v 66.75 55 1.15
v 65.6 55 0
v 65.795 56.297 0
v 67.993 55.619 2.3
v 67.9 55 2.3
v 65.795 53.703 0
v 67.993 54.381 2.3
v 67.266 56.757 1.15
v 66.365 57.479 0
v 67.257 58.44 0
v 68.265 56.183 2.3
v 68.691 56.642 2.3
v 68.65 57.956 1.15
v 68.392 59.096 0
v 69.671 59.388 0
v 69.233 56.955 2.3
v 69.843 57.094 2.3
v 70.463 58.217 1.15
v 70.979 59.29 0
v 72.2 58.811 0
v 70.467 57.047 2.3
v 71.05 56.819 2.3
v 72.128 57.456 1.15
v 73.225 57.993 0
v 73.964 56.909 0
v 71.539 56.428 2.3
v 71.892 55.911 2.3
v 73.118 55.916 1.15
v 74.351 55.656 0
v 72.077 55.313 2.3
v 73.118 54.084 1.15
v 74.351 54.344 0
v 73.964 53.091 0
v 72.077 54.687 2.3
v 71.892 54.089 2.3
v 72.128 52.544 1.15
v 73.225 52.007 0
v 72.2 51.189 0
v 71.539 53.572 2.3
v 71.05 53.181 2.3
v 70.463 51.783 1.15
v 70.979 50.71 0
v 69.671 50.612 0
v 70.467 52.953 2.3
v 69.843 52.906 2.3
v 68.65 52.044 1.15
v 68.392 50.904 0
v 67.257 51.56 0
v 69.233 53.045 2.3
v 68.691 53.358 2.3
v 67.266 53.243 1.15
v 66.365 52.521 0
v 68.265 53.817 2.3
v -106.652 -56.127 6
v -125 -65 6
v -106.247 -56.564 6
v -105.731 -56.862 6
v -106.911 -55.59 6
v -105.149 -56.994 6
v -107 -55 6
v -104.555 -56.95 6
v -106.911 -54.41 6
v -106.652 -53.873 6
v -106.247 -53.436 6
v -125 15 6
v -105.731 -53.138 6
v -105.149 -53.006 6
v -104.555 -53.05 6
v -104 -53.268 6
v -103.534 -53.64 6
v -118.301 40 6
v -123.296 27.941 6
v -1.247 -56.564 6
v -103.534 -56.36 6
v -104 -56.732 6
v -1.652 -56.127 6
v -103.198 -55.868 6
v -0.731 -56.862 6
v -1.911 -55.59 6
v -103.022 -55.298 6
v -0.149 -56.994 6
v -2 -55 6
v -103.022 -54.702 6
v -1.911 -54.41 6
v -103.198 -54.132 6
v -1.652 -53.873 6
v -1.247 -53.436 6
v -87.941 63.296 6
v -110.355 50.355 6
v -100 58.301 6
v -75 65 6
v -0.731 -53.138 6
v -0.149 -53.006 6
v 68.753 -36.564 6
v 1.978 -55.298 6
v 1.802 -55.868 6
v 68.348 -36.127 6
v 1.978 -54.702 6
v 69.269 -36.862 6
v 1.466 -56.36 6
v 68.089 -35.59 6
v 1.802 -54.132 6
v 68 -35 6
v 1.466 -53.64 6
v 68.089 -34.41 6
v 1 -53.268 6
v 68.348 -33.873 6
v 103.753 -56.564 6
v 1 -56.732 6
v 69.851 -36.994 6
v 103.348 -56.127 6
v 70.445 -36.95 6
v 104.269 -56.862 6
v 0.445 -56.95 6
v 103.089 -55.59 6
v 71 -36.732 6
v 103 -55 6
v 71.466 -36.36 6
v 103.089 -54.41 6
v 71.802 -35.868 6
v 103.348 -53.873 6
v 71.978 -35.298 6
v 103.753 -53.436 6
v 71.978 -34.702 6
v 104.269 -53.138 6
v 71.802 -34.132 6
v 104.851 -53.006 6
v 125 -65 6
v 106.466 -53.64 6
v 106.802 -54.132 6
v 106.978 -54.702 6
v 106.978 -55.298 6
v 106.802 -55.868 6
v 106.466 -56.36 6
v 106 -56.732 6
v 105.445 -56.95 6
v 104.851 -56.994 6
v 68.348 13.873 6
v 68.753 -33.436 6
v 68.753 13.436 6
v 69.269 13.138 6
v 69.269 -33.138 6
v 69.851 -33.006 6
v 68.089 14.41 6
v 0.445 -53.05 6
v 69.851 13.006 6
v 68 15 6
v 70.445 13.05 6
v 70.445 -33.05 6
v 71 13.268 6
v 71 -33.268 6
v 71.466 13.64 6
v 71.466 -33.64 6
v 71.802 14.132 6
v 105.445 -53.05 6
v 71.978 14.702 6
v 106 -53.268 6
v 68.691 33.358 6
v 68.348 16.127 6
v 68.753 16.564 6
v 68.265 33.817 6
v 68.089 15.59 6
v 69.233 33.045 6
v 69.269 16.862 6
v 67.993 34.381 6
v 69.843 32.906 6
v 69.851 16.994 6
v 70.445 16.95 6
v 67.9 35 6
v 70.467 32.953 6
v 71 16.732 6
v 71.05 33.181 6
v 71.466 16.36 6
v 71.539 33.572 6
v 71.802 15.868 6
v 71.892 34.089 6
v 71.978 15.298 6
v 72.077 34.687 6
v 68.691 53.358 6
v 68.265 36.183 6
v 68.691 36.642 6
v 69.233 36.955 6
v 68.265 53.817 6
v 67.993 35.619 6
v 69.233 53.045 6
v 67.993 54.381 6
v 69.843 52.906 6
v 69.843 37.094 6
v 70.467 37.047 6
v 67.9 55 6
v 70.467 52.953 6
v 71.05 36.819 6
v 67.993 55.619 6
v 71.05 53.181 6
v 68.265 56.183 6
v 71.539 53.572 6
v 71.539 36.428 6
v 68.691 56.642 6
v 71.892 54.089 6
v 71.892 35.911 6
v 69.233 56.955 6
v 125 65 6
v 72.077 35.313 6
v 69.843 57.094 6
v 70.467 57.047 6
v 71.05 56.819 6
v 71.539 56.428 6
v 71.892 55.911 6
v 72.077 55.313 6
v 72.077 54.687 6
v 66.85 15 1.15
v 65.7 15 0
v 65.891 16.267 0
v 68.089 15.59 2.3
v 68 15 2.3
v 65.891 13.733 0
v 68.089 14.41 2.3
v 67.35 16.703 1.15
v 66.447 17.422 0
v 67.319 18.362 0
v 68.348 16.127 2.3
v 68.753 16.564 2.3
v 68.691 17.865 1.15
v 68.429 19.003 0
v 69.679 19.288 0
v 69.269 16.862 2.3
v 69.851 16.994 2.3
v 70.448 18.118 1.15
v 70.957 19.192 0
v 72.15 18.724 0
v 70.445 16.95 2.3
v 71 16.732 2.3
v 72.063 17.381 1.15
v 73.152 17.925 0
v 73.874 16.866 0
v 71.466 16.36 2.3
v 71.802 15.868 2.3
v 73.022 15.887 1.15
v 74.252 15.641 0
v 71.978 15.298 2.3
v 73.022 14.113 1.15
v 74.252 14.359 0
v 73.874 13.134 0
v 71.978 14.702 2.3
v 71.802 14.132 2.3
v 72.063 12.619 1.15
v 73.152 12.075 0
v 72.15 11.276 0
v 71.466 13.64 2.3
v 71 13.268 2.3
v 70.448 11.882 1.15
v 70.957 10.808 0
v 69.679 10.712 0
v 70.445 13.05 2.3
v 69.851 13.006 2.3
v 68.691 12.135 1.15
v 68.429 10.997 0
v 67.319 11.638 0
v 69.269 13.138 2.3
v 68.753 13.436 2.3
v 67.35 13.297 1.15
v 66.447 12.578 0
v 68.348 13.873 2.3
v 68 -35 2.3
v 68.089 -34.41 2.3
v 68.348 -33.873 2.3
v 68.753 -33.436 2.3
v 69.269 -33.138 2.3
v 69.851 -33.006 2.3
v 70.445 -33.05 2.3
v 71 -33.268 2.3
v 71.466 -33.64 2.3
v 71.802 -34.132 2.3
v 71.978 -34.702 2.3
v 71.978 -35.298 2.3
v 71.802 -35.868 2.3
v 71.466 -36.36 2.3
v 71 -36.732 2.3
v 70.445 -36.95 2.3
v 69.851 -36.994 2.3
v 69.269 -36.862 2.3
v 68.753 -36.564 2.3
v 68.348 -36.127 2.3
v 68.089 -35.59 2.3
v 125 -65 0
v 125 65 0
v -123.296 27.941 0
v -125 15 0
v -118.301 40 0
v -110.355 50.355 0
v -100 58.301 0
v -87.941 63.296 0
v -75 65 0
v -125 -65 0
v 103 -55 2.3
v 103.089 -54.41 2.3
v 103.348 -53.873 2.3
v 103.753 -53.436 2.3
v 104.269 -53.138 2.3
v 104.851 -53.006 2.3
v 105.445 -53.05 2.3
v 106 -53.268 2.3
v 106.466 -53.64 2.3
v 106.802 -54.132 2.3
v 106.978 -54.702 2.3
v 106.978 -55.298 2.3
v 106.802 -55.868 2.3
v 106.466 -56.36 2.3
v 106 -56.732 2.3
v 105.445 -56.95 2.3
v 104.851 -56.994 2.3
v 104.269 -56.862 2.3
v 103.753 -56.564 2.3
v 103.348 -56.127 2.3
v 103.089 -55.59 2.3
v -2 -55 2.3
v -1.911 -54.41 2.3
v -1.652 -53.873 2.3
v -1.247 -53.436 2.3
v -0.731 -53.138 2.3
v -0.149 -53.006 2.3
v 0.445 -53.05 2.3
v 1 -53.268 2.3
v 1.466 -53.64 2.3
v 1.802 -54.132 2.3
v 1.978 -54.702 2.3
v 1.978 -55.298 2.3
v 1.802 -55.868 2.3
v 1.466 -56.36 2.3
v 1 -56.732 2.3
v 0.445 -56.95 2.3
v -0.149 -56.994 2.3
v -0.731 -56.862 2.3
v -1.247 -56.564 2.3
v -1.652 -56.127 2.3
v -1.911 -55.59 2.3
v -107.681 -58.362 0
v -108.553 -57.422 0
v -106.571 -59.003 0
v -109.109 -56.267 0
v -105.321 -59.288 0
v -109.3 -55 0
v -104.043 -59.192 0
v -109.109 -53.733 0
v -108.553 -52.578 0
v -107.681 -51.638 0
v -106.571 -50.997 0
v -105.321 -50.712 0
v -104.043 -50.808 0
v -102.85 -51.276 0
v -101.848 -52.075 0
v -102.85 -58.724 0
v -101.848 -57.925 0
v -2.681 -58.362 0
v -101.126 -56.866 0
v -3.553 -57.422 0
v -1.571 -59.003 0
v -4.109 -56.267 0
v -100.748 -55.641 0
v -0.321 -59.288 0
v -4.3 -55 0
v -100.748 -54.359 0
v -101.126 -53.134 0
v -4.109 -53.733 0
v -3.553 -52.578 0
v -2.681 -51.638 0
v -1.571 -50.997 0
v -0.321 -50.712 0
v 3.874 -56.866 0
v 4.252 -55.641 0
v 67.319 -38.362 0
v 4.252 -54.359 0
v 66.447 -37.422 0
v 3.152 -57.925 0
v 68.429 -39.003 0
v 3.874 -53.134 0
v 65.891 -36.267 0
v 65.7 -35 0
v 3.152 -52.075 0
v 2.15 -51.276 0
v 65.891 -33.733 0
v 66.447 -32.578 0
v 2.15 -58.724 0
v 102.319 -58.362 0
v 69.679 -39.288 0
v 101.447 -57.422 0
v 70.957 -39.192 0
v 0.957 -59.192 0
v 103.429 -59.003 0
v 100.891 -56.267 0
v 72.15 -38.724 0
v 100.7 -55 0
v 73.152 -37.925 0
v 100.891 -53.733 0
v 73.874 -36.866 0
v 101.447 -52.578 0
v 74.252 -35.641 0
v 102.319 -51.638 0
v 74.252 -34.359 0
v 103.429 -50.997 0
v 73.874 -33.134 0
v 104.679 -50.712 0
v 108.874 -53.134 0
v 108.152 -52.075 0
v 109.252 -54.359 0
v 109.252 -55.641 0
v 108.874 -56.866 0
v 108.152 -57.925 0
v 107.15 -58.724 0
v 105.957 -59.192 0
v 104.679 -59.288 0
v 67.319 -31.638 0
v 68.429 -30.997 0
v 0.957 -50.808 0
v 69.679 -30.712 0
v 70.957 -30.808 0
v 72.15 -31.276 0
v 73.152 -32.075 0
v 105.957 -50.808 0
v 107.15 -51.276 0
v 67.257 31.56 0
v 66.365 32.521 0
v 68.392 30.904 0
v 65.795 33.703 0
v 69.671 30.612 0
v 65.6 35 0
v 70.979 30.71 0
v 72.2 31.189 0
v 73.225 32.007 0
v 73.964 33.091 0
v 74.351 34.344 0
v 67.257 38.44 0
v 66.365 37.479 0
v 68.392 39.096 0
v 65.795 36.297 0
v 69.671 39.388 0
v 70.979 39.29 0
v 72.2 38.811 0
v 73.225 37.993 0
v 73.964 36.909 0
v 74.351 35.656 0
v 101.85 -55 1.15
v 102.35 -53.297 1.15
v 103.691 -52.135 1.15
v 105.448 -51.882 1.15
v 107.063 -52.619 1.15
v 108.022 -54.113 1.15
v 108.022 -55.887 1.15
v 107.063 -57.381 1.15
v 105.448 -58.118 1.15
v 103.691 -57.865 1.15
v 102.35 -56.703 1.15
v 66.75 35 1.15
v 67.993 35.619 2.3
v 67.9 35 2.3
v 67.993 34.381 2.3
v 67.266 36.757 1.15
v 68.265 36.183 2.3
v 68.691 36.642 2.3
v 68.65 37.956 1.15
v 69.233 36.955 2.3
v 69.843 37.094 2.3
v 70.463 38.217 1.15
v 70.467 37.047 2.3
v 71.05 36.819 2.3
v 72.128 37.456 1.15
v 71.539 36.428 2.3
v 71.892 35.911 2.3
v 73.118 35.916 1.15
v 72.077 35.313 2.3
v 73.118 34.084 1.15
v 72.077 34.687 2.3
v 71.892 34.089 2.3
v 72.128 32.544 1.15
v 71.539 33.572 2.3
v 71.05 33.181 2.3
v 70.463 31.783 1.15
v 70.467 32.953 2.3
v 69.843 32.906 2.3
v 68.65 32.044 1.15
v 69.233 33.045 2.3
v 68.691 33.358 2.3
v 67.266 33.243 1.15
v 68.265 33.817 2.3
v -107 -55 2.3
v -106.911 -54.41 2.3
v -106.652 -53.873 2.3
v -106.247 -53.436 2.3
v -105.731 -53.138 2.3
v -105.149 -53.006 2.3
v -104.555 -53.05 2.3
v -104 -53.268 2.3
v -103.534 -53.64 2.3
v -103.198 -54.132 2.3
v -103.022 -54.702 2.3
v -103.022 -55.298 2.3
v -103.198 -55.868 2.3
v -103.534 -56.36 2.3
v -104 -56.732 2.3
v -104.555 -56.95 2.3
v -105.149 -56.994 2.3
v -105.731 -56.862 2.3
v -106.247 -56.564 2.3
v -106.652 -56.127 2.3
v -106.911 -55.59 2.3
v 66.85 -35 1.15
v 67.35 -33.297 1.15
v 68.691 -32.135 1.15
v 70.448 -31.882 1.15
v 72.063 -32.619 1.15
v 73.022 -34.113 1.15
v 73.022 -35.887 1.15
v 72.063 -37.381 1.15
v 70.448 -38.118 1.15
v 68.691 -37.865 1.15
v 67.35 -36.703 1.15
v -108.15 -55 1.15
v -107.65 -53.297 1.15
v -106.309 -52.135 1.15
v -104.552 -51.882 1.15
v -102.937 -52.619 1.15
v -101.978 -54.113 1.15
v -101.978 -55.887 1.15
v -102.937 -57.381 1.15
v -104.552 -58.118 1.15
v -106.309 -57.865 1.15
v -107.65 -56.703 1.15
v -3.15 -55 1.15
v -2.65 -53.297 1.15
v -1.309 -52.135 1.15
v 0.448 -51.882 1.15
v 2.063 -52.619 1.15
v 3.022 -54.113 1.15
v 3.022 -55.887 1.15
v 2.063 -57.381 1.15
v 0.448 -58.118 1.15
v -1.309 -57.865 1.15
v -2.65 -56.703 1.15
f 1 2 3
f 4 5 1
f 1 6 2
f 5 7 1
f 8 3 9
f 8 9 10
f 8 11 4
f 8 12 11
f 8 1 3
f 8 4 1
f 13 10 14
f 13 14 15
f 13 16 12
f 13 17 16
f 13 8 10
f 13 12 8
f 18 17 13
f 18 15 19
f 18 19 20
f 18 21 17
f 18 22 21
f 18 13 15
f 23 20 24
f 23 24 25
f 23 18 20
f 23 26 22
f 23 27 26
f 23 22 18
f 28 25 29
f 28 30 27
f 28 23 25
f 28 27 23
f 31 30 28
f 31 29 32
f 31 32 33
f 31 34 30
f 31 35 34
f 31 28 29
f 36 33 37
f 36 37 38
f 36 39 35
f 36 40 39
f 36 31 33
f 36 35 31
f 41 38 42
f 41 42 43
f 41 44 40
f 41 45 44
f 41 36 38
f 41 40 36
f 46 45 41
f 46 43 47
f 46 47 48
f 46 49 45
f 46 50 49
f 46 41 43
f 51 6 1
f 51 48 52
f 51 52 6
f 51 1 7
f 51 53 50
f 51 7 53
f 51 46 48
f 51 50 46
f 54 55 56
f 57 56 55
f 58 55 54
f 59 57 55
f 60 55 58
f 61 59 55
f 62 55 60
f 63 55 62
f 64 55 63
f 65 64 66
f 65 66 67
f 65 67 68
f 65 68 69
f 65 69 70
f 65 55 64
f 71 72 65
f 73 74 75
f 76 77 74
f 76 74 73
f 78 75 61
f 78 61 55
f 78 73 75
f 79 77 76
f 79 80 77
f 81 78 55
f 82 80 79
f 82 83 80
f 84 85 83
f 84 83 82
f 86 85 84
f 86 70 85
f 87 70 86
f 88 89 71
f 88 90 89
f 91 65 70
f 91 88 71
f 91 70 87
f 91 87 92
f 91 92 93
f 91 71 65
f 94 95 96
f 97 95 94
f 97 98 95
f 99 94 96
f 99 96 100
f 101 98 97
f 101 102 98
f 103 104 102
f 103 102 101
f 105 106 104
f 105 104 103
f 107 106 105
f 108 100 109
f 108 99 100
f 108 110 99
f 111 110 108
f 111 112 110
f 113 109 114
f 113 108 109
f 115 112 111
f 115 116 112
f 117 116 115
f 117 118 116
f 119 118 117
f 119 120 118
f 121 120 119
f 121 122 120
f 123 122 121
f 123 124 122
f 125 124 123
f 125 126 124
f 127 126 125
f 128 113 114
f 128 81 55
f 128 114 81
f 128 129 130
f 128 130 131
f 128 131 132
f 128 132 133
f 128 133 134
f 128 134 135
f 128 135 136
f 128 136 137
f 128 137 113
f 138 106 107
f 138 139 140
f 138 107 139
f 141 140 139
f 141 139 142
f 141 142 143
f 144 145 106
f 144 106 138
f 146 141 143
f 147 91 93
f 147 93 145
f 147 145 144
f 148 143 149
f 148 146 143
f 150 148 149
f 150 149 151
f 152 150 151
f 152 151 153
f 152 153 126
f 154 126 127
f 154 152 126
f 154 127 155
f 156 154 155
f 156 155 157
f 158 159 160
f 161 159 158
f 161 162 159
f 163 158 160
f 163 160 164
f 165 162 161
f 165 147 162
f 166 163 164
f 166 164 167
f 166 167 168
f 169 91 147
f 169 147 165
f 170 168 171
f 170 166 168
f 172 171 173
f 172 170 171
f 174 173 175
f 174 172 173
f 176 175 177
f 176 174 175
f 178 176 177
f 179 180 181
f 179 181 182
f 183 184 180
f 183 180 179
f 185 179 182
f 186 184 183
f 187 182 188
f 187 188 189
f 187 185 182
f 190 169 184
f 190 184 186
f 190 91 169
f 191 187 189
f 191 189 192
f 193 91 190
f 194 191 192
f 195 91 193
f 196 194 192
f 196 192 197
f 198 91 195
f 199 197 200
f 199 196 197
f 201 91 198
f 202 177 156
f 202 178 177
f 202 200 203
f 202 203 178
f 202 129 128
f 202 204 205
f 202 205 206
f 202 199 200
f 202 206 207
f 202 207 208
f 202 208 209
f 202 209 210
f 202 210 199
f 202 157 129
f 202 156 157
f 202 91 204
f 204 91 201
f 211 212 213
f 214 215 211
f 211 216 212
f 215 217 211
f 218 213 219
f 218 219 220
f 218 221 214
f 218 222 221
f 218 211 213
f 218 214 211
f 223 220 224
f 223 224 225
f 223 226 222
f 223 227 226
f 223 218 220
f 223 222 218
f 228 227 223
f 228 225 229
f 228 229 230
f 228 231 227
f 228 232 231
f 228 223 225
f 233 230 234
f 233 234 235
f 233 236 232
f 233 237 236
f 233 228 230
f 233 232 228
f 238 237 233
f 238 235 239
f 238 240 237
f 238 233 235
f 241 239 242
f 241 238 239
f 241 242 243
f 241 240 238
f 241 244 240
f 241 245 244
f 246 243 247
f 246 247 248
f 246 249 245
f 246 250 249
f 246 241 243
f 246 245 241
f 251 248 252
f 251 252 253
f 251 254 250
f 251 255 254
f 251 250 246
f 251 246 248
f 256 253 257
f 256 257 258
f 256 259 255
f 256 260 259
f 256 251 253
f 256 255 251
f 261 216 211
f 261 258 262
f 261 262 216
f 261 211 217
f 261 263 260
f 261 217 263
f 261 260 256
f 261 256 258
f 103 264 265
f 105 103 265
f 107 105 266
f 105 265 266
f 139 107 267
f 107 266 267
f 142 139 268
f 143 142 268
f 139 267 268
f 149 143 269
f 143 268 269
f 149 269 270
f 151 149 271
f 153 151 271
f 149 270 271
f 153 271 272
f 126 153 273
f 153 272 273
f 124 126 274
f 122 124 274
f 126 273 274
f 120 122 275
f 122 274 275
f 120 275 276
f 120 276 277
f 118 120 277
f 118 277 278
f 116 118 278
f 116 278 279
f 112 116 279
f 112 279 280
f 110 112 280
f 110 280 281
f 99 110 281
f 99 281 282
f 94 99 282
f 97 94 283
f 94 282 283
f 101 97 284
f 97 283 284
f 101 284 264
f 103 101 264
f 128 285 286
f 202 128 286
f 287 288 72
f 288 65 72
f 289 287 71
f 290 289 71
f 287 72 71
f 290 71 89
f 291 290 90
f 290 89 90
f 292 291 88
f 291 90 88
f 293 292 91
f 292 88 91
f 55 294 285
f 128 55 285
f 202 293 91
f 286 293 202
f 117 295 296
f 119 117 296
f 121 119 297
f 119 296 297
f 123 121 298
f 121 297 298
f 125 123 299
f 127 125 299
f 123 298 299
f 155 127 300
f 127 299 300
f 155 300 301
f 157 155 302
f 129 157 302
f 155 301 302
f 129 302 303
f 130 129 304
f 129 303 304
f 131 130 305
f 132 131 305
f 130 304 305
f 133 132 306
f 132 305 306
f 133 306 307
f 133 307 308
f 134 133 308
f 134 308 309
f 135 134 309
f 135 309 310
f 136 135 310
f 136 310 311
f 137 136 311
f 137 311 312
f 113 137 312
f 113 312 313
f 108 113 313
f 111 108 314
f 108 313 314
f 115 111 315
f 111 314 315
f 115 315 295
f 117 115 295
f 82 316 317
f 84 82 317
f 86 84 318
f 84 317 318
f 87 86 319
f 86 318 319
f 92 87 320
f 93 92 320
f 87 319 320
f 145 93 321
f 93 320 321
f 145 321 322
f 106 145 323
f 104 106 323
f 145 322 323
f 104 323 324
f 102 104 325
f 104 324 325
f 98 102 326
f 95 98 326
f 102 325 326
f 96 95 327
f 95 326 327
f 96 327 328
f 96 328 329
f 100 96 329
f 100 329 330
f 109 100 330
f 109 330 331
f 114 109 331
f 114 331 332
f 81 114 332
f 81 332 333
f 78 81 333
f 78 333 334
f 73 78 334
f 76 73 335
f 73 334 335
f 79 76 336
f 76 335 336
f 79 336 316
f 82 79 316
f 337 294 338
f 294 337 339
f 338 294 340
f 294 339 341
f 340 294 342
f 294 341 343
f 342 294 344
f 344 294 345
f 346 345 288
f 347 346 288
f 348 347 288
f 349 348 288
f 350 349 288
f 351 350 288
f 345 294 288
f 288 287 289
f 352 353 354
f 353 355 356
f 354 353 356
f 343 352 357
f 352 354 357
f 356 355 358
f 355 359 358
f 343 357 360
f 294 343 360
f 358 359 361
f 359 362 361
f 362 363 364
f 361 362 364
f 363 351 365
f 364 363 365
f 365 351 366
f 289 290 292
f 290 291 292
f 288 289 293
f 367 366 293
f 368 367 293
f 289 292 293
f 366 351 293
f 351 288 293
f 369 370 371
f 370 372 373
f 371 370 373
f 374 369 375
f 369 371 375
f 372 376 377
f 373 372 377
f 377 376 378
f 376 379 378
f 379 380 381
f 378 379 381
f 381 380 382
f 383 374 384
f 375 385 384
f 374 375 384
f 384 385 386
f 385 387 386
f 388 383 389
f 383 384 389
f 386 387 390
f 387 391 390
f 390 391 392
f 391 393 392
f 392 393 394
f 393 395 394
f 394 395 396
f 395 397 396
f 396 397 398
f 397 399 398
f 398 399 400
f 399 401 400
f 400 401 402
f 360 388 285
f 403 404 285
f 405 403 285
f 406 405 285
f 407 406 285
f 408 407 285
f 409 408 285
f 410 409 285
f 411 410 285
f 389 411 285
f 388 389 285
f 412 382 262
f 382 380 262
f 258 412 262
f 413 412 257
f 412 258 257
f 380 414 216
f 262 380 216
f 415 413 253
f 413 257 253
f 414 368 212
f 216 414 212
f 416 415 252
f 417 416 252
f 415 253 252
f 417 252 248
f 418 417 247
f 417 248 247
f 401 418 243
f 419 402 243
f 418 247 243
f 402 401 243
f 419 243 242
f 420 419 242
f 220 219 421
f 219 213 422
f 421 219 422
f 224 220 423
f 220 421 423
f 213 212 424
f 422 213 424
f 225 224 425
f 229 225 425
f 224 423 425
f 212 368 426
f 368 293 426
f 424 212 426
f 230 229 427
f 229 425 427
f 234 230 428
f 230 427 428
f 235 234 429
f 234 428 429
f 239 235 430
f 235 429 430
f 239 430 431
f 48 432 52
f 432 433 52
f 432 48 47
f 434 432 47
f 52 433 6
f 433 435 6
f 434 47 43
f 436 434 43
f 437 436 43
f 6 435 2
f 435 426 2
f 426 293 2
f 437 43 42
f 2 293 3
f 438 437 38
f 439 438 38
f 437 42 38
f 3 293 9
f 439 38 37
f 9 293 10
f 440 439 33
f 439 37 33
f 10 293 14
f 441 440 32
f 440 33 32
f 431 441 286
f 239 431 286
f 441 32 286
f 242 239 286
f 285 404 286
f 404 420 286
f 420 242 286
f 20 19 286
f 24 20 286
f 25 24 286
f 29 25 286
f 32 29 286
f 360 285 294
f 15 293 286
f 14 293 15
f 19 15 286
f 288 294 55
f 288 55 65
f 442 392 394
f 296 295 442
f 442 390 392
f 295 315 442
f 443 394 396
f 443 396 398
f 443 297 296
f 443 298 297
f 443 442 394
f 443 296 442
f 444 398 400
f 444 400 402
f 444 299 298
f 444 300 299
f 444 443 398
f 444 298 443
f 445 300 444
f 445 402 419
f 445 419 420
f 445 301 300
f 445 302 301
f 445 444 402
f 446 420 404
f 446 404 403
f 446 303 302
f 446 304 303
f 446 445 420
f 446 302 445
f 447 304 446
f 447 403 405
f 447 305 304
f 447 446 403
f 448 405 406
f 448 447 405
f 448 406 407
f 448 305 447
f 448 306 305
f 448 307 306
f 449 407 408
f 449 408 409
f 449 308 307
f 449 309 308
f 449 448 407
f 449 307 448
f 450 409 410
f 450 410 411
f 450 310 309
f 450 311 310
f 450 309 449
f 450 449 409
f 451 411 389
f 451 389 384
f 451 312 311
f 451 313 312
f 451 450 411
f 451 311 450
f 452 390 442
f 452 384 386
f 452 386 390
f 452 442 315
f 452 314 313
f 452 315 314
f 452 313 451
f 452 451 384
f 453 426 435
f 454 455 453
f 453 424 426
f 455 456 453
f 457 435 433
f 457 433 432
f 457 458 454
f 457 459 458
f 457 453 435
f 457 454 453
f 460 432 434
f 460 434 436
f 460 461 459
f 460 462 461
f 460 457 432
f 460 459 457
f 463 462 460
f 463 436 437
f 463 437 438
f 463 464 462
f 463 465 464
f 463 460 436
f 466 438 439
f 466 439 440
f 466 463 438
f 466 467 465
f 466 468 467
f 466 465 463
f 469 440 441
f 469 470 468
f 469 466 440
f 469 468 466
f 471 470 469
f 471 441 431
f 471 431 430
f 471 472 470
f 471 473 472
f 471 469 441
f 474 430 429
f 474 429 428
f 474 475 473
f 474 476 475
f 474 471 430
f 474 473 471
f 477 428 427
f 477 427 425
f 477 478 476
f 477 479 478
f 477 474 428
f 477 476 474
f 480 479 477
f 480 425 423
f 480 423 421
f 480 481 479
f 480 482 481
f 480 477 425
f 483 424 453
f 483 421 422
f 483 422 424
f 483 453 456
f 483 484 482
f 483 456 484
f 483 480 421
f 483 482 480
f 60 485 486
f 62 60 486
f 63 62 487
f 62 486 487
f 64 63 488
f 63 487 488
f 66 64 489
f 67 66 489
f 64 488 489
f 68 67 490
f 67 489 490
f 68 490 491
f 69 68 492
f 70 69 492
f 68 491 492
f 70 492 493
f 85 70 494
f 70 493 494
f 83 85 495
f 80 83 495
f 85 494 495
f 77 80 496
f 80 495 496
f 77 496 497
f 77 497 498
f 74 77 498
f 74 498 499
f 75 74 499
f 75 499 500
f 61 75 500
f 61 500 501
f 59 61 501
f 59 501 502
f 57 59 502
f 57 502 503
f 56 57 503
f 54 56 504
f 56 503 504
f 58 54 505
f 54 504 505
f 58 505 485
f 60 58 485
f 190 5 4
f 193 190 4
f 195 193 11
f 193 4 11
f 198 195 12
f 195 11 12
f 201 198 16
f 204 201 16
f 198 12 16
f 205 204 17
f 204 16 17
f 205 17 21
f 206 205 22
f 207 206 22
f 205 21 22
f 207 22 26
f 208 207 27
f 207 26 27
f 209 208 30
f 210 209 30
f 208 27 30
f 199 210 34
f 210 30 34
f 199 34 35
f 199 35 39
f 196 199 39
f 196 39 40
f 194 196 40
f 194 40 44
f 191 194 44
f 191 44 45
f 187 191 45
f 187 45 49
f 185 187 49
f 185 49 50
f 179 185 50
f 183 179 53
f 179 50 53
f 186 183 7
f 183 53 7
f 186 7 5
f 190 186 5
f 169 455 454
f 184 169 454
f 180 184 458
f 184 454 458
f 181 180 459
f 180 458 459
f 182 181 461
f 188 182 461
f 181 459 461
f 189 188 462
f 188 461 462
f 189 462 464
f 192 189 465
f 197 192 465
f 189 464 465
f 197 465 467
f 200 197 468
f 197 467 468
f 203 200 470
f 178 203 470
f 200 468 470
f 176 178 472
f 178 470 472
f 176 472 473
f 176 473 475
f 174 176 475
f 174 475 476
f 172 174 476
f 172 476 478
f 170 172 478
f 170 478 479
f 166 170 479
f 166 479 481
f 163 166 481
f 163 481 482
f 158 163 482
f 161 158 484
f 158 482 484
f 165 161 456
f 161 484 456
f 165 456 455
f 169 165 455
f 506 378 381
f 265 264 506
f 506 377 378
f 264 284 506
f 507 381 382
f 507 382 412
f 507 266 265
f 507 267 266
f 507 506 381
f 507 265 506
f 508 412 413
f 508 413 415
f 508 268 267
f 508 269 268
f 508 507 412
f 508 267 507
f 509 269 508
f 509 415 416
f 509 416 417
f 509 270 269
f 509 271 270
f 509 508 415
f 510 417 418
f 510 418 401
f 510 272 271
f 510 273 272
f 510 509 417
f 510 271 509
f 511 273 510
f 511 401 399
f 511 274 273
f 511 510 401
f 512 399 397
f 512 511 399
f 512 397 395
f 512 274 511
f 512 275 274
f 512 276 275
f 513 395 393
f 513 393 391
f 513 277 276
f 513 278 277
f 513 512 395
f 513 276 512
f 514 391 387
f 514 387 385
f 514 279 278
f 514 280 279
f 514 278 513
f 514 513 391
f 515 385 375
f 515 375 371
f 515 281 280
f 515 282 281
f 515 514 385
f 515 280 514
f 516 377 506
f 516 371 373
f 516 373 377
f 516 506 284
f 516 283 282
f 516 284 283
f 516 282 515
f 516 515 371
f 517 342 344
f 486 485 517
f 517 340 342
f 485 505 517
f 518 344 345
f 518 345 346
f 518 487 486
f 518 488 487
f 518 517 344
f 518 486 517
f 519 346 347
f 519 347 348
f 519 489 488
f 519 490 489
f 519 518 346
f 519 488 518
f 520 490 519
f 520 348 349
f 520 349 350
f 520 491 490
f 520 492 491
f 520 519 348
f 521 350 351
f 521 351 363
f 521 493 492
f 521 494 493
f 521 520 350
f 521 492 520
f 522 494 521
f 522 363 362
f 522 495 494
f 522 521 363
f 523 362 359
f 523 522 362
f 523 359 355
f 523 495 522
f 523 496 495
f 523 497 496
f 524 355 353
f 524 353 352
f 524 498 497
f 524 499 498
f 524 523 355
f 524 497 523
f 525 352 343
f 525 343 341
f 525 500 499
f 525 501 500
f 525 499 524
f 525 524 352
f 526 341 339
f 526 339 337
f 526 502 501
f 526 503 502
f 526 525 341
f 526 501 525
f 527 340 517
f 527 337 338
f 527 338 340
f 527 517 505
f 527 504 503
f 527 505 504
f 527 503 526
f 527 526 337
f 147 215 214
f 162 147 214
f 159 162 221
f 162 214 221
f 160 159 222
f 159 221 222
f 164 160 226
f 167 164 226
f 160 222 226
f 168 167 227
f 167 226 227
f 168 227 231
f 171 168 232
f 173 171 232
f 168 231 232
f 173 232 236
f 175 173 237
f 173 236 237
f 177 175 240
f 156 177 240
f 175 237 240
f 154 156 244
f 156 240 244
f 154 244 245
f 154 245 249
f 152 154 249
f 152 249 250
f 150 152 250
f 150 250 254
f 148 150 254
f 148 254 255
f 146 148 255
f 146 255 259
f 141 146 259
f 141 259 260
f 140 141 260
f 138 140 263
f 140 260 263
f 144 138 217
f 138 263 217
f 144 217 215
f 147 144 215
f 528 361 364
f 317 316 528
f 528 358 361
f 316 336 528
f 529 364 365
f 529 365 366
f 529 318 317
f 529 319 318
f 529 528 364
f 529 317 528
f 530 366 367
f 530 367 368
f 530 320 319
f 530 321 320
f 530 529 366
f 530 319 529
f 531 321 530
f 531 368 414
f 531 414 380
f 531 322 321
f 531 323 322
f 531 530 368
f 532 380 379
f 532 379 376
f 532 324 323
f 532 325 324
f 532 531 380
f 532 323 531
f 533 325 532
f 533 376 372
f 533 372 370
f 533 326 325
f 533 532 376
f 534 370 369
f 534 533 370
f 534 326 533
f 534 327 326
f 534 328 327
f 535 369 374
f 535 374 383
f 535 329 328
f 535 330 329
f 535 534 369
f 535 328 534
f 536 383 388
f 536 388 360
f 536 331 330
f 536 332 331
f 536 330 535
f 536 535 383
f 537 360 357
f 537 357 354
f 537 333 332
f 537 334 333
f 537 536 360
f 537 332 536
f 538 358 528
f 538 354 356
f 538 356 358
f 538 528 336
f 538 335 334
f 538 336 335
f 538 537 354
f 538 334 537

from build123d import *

# Parameters (mm, degrees)
ESBO_O1_W                = 250
ESBO_O1_H                = 130
RESSALTO_EXTRUS_O1_DEPTH = 6
FILETE1_R                = 50
ESBO_O2_R                = 2
CORTE_EXTRUS_O1_DEPTH    = 6
ESBO_O3_R                = 2.1
CORTE_EXTRUS_O2_DEPTH    = 6
ESBO_O4_R                = 2
CORTE_EXTRUS_O3_DEPTH    = 6
CHANFRO1_SIZE            = 2.3


with BuildPart() as part:
    # Esboço1 → Ressalto-extrusão1 (new body)
    with BuildSketch(Plane.XY):
        Rectangle(ESBO_O1_W, ESBO_O1_H)
    extrude(amount=RESSALTO_EXTRUS_O1_DEPTH)

    # Filete1
    filete1_edges = [part.edges().sort_by_distance(p)[0] for p in [
        (-125, 65, 3),
    ]]
    fillet(filete1_edges, radius=FILETE1_R)

    # Esboço2 → Corte-extrusão1 (cut)
    with BuildSketch(Plane(origin=(0, 0, 0), x_dir=(-1, 0, 0), z_dir=(0, 0, -1))):
        with Locations((0, -55)):
            Circle(ESBO_O2_R)
        with Locations((105, -55)):
            Circle(ESBO_O2_R)
        with Locations((-105, -55)):
            Circle(ESBO_O2_R)
    extrude(amount=-CORTE_EXTRUS_O1_DEPTH, mode=Mode.SUBTRACT)

    # Esboço3 → Corte-extrusão2 (cut)
    with BuildSketch(Plane(origin=(0, 0, 0), x_dir=(-1, 0, 0), z_dir=(0, 0, -1))):
        with Locations((-70, 55)):
            Circle(ESBO_O3_R)
        with Locations((-70, 35)):
            Circle(ESBO_O3_R)
    extrude(amount=-CORTE_EXTRUS_O2_DEPTH, mode=Mode.SUBTRACT)

    # Esboço4 → Corte-extrusão3 (cut)
    with BuildSketch(Plane(origin=(0, 0, 0), x_dir=(-1, 0, 0), z_dir=(0, 0, -1))):
        with Locations((-70, 15)):
            Circle(ESBO_O4_R)
        with Locations((-70, -35)):
            Circle(ESBO_O4_R)
    extrude(amount=-CORTE_EXTRUS_O3_DEPTH, mode=Mode.SUBTRACT)

    # Chanfro1
    chanfro1_edges = [part.edges().sort_by_distance(p)[0] for p in [
        (-103, -55, 0),
        (2, -55, 0),
        (107, -55, 0),
        (72.1, 55, 0),
        (72.1, 35, 0),
        (72, 15, 0),
        (72, -35, 0),
    ]]
    chamfer(chanfro1_edges, length=CHANFRO1_SIZE)


solid = part.part
